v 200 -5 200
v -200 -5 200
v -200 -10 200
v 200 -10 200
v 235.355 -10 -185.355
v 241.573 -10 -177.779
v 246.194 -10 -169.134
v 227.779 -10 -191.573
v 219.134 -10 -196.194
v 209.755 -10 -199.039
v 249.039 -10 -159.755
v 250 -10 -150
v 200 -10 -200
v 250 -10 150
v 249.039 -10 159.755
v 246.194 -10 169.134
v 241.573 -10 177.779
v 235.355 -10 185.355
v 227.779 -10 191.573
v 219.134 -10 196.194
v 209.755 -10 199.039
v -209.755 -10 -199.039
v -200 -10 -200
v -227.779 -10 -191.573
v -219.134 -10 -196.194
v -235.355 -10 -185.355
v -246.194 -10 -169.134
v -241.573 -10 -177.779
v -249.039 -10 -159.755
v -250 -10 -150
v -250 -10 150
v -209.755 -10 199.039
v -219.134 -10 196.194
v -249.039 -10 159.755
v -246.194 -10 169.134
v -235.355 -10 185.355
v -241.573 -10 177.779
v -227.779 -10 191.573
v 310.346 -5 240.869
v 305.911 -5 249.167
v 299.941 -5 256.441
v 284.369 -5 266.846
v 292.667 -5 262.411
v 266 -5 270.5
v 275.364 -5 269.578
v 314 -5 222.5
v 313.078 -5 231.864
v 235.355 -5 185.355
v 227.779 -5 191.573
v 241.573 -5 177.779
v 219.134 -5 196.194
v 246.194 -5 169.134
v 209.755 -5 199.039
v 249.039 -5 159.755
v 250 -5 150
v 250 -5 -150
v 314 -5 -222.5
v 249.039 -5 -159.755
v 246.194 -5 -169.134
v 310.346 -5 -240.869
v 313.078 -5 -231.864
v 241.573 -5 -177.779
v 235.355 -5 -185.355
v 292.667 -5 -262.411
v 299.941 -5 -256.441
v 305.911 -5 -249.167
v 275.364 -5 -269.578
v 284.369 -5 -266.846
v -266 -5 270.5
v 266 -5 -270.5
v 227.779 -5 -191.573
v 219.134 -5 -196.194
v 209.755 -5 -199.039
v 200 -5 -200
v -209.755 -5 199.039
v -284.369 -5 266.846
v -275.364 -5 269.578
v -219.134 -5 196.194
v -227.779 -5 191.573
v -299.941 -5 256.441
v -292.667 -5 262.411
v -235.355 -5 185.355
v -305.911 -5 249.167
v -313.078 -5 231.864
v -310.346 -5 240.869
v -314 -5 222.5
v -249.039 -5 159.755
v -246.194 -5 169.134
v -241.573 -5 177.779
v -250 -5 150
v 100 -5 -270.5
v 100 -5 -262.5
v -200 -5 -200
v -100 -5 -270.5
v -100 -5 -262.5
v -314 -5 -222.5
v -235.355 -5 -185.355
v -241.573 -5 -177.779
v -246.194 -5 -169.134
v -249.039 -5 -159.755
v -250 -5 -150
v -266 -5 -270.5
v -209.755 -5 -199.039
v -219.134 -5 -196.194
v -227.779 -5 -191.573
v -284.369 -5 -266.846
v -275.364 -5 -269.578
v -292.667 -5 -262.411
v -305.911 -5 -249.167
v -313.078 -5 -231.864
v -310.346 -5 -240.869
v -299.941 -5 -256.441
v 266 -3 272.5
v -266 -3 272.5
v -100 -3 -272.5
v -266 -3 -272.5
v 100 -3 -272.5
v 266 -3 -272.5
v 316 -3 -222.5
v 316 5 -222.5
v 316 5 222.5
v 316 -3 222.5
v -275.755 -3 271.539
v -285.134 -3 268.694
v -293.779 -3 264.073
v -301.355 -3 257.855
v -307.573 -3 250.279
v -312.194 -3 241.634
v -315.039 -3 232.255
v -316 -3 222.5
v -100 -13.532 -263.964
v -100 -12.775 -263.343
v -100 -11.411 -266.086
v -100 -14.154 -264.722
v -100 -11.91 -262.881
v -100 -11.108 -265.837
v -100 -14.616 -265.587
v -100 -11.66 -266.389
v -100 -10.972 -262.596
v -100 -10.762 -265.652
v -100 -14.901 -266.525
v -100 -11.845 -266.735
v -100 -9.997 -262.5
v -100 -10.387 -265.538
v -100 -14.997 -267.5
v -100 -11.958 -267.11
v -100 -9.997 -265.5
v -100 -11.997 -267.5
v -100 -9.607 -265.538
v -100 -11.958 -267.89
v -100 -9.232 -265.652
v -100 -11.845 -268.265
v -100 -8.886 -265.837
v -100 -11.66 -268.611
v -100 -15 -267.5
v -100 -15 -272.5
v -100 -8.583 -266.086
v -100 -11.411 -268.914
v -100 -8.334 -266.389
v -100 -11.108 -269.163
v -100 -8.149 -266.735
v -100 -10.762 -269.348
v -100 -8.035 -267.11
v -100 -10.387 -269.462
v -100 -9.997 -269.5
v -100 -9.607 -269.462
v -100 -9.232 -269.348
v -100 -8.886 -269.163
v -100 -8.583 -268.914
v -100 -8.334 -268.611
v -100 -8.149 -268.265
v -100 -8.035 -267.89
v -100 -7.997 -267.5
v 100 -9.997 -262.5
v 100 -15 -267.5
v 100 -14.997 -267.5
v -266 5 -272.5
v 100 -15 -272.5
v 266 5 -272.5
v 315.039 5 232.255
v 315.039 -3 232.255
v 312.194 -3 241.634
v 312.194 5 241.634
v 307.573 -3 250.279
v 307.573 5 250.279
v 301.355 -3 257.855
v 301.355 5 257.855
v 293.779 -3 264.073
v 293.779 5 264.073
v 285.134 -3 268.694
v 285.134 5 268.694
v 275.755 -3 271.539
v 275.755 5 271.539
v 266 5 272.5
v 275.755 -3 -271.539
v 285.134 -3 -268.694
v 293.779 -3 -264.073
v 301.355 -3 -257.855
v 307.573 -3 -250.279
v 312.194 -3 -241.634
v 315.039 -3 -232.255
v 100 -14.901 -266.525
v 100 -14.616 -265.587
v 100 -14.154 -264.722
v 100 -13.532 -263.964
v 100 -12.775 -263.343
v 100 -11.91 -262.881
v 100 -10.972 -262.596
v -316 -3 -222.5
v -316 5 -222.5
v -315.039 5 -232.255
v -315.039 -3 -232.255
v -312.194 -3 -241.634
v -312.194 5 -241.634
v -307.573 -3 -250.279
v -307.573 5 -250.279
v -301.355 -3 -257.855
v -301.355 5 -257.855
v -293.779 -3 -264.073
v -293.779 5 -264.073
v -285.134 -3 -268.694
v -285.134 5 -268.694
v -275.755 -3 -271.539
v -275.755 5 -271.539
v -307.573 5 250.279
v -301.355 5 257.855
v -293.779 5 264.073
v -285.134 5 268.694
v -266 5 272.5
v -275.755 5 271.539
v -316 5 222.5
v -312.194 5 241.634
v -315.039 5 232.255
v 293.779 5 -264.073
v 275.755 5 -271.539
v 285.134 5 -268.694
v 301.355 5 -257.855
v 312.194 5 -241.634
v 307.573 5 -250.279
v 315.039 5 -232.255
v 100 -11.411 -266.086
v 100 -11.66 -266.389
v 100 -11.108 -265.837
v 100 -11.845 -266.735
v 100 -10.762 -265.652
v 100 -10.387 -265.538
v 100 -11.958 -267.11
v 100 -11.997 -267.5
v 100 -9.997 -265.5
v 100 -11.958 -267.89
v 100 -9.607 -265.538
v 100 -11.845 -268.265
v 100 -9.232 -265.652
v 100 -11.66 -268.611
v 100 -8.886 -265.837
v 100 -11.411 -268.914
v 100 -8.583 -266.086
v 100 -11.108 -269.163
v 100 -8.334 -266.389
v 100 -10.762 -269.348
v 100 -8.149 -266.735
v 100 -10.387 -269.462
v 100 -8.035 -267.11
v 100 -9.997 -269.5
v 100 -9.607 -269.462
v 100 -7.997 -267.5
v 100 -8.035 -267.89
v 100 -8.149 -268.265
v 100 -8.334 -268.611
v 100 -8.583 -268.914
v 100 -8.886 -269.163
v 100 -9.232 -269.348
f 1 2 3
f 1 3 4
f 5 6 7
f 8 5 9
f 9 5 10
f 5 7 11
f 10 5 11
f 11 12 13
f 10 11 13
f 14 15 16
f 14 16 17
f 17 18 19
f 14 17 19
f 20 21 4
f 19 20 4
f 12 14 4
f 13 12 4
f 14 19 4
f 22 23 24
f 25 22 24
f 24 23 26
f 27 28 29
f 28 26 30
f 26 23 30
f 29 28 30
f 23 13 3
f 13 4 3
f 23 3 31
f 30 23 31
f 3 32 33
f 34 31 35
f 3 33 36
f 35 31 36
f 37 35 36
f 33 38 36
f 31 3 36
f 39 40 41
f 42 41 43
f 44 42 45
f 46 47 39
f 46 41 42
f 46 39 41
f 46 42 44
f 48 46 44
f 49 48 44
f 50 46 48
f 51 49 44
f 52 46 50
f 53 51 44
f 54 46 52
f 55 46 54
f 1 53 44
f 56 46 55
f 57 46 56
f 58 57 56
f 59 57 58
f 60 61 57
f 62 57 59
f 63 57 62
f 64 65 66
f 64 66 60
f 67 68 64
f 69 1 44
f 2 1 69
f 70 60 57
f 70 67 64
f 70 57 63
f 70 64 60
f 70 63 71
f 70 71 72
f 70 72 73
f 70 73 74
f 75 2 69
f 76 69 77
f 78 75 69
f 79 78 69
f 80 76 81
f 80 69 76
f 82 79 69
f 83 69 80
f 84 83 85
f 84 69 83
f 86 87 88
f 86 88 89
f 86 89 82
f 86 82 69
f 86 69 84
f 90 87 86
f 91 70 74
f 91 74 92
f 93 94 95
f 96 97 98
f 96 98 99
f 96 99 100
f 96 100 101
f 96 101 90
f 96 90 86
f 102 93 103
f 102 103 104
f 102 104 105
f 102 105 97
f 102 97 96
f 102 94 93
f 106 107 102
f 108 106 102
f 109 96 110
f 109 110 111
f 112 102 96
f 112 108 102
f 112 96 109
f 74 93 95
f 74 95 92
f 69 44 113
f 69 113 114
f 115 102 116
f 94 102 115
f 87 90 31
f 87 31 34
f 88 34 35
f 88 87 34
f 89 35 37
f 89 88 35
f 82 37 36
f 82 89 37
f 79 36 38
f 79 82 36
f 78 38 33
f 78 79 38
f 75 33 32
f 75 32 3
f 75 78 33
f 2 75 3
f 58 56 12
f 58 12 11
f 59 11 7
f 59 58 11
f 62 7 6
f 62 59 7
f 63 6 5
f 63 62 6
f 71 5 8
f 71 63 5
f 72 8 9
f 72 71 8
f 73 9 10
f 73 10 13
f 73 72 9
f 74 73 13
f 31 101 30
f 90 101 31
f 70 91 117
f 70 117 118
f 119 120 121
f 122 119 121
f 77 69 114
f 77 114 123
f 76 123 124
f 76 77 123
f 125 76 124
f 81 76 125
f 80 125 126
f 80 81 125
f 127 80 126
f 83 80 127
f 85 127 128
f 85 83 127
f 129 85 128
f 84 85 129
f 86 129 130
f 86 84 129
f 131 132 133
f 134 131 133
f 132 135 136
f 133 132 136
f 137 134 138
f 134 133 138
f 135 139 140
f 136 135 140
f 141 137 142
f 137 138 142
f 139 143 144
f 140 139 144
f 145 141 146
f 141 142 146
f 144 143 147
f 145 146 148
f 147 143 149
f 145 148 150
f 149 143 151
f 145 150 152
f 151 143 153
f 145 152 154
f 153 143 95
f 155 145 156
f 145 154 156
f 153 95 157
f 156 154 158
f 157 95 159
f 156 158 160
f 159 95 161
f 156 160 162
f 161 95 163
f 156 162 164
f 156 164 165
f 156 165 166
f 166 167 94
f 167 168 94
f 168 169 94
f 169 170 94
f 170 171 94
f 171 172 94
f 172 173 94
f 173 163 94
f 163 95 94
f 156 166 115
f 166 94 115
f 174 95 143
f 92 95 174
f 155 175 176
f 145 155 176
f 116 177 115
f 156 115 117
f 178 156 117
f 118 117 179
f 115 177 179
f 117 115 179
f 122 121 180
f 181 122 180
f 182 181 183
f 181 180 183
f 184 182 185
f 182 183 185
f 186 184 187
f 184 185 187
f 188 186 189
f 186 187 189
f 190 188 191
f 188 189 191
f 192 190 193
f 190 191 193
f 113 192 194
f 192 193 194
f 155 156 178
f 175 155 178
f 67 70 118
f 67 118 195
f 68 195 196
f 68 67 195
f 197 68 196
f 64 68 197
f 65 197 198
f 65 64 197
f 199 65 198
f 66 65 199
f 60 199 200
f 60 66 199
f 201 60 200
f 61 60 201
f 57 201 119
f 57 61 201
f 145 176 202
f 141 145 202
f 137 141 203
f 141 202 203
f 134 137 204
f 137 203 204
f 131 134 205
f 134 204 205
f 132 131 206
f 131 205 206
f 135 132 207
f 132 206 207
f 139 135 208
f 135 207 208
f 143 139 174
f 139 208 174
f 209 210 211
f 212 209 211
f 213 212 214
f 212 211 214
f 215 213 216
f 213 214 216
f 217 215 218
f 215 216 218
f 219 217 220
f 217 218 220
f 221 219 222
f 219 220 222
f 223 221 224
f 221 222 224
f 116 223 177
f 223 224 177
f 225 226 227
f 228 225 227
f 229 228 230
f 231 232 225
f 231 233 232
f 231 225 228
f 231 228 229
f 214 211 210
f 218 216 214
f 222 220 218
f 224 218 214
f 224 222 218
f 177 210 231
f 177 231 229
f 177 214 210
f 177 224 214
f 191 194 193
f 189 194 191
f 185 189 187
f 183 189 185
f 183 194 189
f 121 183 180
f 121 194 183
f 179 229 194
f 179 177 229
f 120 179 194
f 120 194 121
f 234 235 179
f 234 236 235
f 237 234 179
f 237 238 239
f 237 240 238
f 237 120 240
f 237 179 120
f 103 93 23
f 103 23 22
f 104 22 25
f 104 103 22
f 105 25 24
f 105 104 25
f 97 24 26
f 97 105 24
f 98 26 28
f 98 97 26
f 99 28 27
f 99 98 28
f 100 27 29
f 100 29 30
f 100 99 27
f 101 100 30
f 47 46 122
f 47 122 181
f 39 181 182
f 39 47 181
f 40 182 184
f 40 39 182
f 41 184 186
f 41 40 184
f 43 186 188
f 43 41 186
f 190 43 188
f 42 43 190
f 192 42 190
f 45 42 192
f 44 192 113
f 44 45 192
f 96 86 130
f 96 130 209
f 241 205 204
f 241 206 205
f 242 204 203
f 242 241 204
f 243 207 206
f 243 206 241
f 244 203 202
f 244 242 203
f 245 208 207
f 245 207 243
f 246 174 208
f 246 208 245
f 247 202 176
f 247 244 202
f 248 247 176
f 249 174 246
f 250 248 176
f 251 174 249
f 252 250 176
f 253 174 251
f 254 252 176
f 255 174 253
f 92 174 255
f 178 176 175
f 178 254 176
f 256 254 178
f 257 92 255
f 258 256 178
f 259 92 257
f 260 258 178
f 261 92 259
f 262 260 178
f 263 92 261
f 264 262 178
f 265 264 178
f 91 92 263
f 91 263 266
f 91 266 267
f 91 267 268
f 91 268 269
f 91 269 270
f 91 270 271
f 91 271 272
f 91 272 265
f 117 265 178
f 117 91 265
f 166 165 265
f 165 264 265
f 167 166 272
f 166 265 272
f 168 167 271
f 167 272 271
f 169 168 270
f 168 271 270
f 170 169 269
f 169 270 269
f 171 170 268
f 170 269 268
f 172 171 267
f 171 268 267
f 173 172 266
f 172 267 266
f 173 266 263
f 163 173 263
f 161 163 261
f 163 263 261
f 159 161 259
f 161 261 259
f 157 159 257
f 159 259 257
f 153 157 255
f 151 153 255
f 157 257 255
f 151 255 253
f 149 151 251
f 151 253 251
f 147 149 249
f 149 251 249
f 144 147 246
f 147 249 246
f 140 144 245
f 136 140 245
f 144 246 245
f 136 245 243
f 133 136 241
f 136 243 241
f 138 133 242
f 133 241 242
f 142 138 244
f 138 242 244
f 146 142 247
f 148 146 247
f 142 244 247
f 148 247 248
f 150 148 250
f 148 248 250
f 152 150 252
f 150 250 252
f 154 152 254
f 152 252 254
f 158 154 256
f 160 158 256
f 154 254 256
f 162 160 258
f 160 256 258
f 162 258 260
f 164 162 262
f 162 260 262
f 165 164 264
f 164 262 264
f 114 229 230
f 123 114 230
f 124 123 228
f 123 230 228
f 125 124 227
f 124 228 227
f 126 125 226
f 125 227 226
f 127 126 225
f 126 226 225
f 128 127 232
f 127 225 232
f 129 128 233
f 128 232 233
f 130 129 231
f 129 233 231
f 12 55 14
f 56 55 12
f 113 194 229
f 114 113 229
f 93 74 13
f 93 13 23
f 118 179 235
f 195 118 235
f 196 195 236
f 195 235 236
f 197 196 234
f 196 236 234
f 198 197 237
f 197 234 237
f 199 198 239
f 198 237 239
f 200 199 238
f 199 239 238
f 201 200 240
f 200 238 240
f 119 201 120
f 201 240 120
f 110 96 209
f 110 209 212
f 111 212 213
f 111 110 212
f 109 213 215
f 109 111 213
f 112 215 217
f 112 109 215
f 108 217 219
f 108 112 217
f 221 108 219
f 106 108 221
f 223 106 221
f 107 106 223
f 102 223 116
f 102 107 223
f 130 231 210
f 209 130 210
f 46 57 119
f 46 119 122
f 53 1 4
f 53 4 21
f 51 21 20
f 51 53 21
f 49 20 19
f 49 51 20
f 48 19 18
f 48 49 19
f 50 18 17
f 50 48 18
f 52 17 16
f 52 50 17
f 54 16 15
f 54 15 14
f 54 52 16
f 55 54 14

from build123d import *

# Parameters (mm, degrees)
BOSS_EXTRUDE1_DEPTH            = 5
CHAMFER1_SIZE                  = 2
SKETCH4_W                      = 200
SKETCH4_H                      = 10
BOSS_EXTRUDE3_DEPTH            = 20
CUT_EXTRUDE1_REACH             = 318
SKETCH5_R                      = 2
CUT_EXTRUDE1_DIRECTION_2_REACH = 318
BOSS_EXTRUDE4_DEPTH            = 5


with BuildPart() as part:
    # Sketch1 → Boss-Extrude1 (new body, symmetric)
    with BuildSketch(Plane(origin=(0, 0, 0), x_dir=(1, 0, 0), z_dir=(0, 1, 0))):
        with BuildLine():
            Line((-266, 272.5), (266, 272.5))
            ThreePointArc((266, 272.5), (301.355339059, 257.855339059), (316, 222.5))
            Line((316, 222.5), (316, -222.5))
            ThreePointArc((316, -222.5), (301.355339059, -257.855339059), (266, -272.5))
            Line((266, -272.5), (-266, -272.5))
            ThreePointArc((-266, -272.5), (-301.355339059, -257.855339059), (-316, -222.5))
            Line((-316, -222.5), (-316, 222.5))
            ThreePointArc((-316, 222.5), (-301.355339059, 257.855339059), (-266, 272.5))
        make_face()
    extrude(amount=BOSS_EXTRUDE1_DEPTH, both=True)

    # Chamfer1
    chamfer1_edges = [part.edges().sort_by_distance(p)[0] for p in [
        (316, -5, 0),
        (301.355339059, -5, 257.855339059),
        (0, -5, 272.5),
        (-301.355339059, -5, 257.855339059),
        (-316, -5, 0),
        (-301.355339059, -5, -257.855339059),
        (0, -5, -272.5),
        (301.355339059, -5, -257.855339059),
    ]]
    chamfer(chamfer1_edges, length=CHAMFER1_SIZE)

    # Sketch4 → Boss-Extrude3 (add)
    with BuildSketch(Plane(origin=(0, 5, 0), x_dir=(1, 0, 0), z_dir=(0, 1, 0))):
        with Locations((0, 267.5)):
            Rectangle(SKETCH4_W, SKETCH4_H)
    extrude(amount=-BOSS_EXTRUDE3_DEPTH)

    # Sketch5 → Cut-Extrude1 (cut, up to next)
    with BuildSketch(Plane(origin=(0, 0, 0), x_dir=(0, 0, -1), z_dir=(1, 0, 0)), mode=Mode.PRIVATE) as cut_extrude1_sk1:
        with Locations((267.5, -9.996889361)):
            Circle(SKETCH5_R)
    cut_extrude1_tool1 = extrude(cut_extrude1_sk1.sketch, amount=-CUT_EXTRUDE1_REACH, mode=Mode.PRIVATE) & part.part
    add(cut_extrude1_tool1.solids().sort_by_distance((0, -9.996889, -267.5))[0], mode=Mode.SUBTRACT)
    # Sketch5 → Cut-Extrude1 (cut, up to next)
    with BuildSketch(Plane(origin=(0, 0, 0), x_dir=(0, 0, -1), z_dir=(1, 0, 0)), mode=Mode.PRIVATE) as cut_extrude1_sk2:
        with BuildLine():
            Line((267.5, -15), (267.5, -14.996889361))
            ThreePointArc((267.5, -14.996889361), (263.964466094, -13.532423267), (262.5, -9.996889361))
            Line((262.5, -9.996889361), (262.5, -15))
            Line((262.5, -15), (267.5, -15))
        make_face()
    cut_extrude1_tool2 = extrude(cut_extrude1_sk2.sketch, amount=-CUT_EXTRUDE1_REACH, mode=Mode.PRIVATE) & part.part
    add(cut_extrude1_tool2.solids().sort_by_distance((0, -13.883283, -263.620838))[0], mode=Mode.SUBTRACT)

    # Sketch5 → Cut-Extrude1 direction 2 (cut, up to next)
    with BuildSketch(Plane(origin=(0, 0, 0), x_dir=(0, 0, -1), z_dir=(1, 0, 0)), mode=Mode.PRIVATE) as cut_extrude1_direction_2_sk1:
        with Locations((267.5, -9.996889361)):
            Circle(SKETCH5_R)
    cut_extrude1_direction_2_tool1 = extrude(cut_extrude1_direction_2_sk1.sketch, amount=CUT_EXTRUDE1_DIRECTION_2_REACH, mode=Mode.PRIVATE) & part.part
    add(cut_extrude1_direction_2_tool1.solids().sort_by_distance((0, -9.996889, -267.5))[0], mode=Mode.SUBTRACT)
    # Sketch5 → Cut-Extrude1 direction 2 (cut, up to next)
    with BuildSketch(Plane(origin=(0, 0, 0), x_dir=(0, 0, -1), z_dir=(1, 0, 0)), mode=Mode.PRIVATE) as cut_extrude1_direction_2_sk2:
        with BuildLine():
            Line((267.5, -15), (267.5, -14.996889361))
            ThreePointArc((267.5, -14.996889361), (263.964466094, -13.532423267), (262.5, -9.996889361))
            Line((262.5, -9.996889361), (262.5, -15))
            Line((262.5, -15), (267.5, -15))
        make_face()
    cut_extrude1_direction_2_tool2 = extrude(cut_extrude1_direction_2_sk2.sketch, amount=CUT_EXTRUDE1_DIRECTION_2_REACH, mode=Mode.PRIVATE) & part.part
    add(cut_extrude1_direction_2_tool2.solids().sort_by_distance((0, -13.883283, -263.620838))[0], mode=Mode.SUBTRACT)

    # Sketch6 → Boss-Extrude4 (add)
    with BuildSketch(Plane.XZ.offset(5)):
        with BuildLine():
            Line((-200, 200), (200, 200))
            ThreePointArc((200, 200), (235.355339059, 185.355339059), (250, 150))
            Line((250, 150), (250, -150))
            ThreePointArc((250, -150), (235.355339059, -185.355339059), (200, -200))
            Line((200, -200), (-200, -200))
            ThreePointArc((-200, -200), (-235.355339059, -185.355339059), (-250, -150))
            Line((-250, -150), (-250, 150))
            ThreePointArc((-250, 150), (-235.355339059, 185.355339059), (-200, 200))
        make_face()
    extrude(amount=BOSS_EXTRUDE4_DEPTH)


solid = part.part
